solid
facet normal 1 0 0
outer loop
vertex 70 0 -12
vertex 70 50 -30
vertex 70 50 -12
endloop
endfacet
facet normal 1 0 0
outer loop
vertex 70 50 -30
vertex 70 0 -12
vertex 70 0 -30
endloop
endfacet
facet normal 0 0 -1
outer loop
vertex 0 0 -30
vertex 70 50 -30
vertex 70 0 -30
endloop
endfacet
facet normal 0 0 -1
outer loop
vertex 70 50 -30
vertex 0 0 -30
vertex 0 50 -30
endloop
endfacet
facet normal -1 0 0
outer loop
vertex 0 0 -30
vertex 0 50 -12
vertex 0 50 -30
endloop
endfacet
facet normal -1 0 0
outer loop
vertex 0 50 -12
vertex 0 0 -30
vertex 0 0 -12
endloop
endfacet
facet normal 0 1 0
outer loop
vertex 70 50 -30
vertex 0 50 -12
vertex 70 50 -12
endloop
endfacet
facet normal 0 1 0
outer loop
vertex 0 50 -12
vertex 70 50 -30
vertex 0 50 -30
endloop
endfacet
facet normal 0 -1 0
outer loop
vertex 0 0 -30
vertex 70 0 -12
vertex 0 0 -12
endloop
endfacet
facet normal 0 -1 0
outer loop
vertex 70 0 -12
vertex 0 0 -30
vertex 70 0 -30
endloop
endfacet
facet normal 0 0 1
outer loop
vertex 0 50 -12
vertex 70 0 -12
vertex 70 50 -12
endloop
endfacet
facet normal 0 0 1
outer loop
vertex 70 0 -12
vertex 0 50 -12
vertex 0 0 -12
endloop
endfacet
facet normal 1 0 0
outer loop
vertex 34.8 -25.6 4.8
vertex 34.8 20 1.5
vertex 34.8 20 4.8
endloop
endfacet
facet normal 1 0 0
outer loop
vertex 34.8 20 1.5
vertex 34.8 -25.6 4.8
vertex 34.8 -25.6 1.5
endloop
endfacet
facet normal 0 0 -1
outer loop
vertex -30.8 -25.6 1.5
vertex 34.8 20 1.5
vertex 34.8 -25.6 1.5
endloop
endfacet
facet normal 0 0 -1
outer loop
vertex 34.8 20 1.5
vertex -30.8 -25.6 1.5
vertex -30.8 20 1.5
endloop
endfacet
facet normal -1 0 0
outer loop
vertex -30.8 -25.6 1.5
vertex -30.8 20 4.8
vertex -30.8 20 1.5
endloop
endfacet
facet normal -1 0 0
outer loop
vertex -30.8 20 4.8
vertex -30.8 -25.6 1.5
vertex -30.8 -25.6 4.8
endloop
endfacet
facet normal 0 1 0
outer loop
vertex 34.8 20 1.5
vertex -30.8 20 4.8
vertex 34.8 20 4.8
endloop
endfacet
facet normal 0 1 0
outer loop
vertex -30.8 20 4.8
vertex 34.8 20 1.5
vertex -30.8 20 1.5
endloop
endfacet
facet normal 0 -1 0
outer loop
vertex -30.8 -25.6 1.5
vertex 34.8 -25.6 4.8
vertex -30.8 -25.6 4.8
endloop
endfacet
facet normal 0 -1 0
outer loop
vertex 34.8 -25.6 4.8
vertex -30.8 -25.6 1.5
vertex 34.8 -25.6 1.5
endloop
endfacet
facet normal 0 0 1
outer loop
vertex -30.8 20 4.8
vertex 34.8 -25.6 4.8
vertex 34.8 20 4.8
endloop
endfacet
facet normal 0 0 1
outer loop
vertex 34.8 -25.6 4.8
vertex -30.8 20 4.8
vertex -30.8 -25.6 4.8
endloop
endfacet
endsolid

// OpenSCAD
// Part 1: Box enclosure
$fn = 64;

translate([0, 0, -30])
cube([70, 50, 2]);

translate([0, 0, -28])
cube([70, 50, 2]);

translate([0, 0, -26])
cube([70, 50, 2]);

translate([0, 0, -24])
cube([70, 50, 2]);

translate([0, 0, -22])
cube([70, 50, 2]);

translate([0, 0, -20])
cube([70, 50, 2]);

translate([0, 0, -18])
cube([70, 50, 2]);

translate([0, 0, -16])
cube([70, 50, 2]);

translate([0, 0, -14])
cube([70, 50, 2]);

// Part 2: Lid
$fn = 64;

translate([-30.8, -25.6, 1.5])
cube([65.6, 45.6, 1.5]);

translate([-30.8, -25.6, 1.7])
cube([65.6, 45.6, 1.5]);

translate([-30.8, -25.6, 1.9])
cube([65.6, 45.6, 1.5]);

translate([-30.8, -25.6, 2.1])
cube([65.6, 45.6, 1.5]);

translate([-30.8, -25.6, 2.3])
cube([65.6, 45.6, 1.5]);

translate([-30.8, -25.6, 2.5])
cube([65.6, 45.6, 1.5]);

translate([-30.8, -25.6, 2.7])
cube([65.6, 45.6, 1.5]);

translate([-30.8, -25.6, 2.9])
cube([65.6, 45.6, 1.5]);

translate([-30.8, -25.6, 3.1])
cube([65.6, 45.6, 1.5]);

translate([-30.8, -25.6, 3.3])
cube([65.6, 45.6, 1.5]);
